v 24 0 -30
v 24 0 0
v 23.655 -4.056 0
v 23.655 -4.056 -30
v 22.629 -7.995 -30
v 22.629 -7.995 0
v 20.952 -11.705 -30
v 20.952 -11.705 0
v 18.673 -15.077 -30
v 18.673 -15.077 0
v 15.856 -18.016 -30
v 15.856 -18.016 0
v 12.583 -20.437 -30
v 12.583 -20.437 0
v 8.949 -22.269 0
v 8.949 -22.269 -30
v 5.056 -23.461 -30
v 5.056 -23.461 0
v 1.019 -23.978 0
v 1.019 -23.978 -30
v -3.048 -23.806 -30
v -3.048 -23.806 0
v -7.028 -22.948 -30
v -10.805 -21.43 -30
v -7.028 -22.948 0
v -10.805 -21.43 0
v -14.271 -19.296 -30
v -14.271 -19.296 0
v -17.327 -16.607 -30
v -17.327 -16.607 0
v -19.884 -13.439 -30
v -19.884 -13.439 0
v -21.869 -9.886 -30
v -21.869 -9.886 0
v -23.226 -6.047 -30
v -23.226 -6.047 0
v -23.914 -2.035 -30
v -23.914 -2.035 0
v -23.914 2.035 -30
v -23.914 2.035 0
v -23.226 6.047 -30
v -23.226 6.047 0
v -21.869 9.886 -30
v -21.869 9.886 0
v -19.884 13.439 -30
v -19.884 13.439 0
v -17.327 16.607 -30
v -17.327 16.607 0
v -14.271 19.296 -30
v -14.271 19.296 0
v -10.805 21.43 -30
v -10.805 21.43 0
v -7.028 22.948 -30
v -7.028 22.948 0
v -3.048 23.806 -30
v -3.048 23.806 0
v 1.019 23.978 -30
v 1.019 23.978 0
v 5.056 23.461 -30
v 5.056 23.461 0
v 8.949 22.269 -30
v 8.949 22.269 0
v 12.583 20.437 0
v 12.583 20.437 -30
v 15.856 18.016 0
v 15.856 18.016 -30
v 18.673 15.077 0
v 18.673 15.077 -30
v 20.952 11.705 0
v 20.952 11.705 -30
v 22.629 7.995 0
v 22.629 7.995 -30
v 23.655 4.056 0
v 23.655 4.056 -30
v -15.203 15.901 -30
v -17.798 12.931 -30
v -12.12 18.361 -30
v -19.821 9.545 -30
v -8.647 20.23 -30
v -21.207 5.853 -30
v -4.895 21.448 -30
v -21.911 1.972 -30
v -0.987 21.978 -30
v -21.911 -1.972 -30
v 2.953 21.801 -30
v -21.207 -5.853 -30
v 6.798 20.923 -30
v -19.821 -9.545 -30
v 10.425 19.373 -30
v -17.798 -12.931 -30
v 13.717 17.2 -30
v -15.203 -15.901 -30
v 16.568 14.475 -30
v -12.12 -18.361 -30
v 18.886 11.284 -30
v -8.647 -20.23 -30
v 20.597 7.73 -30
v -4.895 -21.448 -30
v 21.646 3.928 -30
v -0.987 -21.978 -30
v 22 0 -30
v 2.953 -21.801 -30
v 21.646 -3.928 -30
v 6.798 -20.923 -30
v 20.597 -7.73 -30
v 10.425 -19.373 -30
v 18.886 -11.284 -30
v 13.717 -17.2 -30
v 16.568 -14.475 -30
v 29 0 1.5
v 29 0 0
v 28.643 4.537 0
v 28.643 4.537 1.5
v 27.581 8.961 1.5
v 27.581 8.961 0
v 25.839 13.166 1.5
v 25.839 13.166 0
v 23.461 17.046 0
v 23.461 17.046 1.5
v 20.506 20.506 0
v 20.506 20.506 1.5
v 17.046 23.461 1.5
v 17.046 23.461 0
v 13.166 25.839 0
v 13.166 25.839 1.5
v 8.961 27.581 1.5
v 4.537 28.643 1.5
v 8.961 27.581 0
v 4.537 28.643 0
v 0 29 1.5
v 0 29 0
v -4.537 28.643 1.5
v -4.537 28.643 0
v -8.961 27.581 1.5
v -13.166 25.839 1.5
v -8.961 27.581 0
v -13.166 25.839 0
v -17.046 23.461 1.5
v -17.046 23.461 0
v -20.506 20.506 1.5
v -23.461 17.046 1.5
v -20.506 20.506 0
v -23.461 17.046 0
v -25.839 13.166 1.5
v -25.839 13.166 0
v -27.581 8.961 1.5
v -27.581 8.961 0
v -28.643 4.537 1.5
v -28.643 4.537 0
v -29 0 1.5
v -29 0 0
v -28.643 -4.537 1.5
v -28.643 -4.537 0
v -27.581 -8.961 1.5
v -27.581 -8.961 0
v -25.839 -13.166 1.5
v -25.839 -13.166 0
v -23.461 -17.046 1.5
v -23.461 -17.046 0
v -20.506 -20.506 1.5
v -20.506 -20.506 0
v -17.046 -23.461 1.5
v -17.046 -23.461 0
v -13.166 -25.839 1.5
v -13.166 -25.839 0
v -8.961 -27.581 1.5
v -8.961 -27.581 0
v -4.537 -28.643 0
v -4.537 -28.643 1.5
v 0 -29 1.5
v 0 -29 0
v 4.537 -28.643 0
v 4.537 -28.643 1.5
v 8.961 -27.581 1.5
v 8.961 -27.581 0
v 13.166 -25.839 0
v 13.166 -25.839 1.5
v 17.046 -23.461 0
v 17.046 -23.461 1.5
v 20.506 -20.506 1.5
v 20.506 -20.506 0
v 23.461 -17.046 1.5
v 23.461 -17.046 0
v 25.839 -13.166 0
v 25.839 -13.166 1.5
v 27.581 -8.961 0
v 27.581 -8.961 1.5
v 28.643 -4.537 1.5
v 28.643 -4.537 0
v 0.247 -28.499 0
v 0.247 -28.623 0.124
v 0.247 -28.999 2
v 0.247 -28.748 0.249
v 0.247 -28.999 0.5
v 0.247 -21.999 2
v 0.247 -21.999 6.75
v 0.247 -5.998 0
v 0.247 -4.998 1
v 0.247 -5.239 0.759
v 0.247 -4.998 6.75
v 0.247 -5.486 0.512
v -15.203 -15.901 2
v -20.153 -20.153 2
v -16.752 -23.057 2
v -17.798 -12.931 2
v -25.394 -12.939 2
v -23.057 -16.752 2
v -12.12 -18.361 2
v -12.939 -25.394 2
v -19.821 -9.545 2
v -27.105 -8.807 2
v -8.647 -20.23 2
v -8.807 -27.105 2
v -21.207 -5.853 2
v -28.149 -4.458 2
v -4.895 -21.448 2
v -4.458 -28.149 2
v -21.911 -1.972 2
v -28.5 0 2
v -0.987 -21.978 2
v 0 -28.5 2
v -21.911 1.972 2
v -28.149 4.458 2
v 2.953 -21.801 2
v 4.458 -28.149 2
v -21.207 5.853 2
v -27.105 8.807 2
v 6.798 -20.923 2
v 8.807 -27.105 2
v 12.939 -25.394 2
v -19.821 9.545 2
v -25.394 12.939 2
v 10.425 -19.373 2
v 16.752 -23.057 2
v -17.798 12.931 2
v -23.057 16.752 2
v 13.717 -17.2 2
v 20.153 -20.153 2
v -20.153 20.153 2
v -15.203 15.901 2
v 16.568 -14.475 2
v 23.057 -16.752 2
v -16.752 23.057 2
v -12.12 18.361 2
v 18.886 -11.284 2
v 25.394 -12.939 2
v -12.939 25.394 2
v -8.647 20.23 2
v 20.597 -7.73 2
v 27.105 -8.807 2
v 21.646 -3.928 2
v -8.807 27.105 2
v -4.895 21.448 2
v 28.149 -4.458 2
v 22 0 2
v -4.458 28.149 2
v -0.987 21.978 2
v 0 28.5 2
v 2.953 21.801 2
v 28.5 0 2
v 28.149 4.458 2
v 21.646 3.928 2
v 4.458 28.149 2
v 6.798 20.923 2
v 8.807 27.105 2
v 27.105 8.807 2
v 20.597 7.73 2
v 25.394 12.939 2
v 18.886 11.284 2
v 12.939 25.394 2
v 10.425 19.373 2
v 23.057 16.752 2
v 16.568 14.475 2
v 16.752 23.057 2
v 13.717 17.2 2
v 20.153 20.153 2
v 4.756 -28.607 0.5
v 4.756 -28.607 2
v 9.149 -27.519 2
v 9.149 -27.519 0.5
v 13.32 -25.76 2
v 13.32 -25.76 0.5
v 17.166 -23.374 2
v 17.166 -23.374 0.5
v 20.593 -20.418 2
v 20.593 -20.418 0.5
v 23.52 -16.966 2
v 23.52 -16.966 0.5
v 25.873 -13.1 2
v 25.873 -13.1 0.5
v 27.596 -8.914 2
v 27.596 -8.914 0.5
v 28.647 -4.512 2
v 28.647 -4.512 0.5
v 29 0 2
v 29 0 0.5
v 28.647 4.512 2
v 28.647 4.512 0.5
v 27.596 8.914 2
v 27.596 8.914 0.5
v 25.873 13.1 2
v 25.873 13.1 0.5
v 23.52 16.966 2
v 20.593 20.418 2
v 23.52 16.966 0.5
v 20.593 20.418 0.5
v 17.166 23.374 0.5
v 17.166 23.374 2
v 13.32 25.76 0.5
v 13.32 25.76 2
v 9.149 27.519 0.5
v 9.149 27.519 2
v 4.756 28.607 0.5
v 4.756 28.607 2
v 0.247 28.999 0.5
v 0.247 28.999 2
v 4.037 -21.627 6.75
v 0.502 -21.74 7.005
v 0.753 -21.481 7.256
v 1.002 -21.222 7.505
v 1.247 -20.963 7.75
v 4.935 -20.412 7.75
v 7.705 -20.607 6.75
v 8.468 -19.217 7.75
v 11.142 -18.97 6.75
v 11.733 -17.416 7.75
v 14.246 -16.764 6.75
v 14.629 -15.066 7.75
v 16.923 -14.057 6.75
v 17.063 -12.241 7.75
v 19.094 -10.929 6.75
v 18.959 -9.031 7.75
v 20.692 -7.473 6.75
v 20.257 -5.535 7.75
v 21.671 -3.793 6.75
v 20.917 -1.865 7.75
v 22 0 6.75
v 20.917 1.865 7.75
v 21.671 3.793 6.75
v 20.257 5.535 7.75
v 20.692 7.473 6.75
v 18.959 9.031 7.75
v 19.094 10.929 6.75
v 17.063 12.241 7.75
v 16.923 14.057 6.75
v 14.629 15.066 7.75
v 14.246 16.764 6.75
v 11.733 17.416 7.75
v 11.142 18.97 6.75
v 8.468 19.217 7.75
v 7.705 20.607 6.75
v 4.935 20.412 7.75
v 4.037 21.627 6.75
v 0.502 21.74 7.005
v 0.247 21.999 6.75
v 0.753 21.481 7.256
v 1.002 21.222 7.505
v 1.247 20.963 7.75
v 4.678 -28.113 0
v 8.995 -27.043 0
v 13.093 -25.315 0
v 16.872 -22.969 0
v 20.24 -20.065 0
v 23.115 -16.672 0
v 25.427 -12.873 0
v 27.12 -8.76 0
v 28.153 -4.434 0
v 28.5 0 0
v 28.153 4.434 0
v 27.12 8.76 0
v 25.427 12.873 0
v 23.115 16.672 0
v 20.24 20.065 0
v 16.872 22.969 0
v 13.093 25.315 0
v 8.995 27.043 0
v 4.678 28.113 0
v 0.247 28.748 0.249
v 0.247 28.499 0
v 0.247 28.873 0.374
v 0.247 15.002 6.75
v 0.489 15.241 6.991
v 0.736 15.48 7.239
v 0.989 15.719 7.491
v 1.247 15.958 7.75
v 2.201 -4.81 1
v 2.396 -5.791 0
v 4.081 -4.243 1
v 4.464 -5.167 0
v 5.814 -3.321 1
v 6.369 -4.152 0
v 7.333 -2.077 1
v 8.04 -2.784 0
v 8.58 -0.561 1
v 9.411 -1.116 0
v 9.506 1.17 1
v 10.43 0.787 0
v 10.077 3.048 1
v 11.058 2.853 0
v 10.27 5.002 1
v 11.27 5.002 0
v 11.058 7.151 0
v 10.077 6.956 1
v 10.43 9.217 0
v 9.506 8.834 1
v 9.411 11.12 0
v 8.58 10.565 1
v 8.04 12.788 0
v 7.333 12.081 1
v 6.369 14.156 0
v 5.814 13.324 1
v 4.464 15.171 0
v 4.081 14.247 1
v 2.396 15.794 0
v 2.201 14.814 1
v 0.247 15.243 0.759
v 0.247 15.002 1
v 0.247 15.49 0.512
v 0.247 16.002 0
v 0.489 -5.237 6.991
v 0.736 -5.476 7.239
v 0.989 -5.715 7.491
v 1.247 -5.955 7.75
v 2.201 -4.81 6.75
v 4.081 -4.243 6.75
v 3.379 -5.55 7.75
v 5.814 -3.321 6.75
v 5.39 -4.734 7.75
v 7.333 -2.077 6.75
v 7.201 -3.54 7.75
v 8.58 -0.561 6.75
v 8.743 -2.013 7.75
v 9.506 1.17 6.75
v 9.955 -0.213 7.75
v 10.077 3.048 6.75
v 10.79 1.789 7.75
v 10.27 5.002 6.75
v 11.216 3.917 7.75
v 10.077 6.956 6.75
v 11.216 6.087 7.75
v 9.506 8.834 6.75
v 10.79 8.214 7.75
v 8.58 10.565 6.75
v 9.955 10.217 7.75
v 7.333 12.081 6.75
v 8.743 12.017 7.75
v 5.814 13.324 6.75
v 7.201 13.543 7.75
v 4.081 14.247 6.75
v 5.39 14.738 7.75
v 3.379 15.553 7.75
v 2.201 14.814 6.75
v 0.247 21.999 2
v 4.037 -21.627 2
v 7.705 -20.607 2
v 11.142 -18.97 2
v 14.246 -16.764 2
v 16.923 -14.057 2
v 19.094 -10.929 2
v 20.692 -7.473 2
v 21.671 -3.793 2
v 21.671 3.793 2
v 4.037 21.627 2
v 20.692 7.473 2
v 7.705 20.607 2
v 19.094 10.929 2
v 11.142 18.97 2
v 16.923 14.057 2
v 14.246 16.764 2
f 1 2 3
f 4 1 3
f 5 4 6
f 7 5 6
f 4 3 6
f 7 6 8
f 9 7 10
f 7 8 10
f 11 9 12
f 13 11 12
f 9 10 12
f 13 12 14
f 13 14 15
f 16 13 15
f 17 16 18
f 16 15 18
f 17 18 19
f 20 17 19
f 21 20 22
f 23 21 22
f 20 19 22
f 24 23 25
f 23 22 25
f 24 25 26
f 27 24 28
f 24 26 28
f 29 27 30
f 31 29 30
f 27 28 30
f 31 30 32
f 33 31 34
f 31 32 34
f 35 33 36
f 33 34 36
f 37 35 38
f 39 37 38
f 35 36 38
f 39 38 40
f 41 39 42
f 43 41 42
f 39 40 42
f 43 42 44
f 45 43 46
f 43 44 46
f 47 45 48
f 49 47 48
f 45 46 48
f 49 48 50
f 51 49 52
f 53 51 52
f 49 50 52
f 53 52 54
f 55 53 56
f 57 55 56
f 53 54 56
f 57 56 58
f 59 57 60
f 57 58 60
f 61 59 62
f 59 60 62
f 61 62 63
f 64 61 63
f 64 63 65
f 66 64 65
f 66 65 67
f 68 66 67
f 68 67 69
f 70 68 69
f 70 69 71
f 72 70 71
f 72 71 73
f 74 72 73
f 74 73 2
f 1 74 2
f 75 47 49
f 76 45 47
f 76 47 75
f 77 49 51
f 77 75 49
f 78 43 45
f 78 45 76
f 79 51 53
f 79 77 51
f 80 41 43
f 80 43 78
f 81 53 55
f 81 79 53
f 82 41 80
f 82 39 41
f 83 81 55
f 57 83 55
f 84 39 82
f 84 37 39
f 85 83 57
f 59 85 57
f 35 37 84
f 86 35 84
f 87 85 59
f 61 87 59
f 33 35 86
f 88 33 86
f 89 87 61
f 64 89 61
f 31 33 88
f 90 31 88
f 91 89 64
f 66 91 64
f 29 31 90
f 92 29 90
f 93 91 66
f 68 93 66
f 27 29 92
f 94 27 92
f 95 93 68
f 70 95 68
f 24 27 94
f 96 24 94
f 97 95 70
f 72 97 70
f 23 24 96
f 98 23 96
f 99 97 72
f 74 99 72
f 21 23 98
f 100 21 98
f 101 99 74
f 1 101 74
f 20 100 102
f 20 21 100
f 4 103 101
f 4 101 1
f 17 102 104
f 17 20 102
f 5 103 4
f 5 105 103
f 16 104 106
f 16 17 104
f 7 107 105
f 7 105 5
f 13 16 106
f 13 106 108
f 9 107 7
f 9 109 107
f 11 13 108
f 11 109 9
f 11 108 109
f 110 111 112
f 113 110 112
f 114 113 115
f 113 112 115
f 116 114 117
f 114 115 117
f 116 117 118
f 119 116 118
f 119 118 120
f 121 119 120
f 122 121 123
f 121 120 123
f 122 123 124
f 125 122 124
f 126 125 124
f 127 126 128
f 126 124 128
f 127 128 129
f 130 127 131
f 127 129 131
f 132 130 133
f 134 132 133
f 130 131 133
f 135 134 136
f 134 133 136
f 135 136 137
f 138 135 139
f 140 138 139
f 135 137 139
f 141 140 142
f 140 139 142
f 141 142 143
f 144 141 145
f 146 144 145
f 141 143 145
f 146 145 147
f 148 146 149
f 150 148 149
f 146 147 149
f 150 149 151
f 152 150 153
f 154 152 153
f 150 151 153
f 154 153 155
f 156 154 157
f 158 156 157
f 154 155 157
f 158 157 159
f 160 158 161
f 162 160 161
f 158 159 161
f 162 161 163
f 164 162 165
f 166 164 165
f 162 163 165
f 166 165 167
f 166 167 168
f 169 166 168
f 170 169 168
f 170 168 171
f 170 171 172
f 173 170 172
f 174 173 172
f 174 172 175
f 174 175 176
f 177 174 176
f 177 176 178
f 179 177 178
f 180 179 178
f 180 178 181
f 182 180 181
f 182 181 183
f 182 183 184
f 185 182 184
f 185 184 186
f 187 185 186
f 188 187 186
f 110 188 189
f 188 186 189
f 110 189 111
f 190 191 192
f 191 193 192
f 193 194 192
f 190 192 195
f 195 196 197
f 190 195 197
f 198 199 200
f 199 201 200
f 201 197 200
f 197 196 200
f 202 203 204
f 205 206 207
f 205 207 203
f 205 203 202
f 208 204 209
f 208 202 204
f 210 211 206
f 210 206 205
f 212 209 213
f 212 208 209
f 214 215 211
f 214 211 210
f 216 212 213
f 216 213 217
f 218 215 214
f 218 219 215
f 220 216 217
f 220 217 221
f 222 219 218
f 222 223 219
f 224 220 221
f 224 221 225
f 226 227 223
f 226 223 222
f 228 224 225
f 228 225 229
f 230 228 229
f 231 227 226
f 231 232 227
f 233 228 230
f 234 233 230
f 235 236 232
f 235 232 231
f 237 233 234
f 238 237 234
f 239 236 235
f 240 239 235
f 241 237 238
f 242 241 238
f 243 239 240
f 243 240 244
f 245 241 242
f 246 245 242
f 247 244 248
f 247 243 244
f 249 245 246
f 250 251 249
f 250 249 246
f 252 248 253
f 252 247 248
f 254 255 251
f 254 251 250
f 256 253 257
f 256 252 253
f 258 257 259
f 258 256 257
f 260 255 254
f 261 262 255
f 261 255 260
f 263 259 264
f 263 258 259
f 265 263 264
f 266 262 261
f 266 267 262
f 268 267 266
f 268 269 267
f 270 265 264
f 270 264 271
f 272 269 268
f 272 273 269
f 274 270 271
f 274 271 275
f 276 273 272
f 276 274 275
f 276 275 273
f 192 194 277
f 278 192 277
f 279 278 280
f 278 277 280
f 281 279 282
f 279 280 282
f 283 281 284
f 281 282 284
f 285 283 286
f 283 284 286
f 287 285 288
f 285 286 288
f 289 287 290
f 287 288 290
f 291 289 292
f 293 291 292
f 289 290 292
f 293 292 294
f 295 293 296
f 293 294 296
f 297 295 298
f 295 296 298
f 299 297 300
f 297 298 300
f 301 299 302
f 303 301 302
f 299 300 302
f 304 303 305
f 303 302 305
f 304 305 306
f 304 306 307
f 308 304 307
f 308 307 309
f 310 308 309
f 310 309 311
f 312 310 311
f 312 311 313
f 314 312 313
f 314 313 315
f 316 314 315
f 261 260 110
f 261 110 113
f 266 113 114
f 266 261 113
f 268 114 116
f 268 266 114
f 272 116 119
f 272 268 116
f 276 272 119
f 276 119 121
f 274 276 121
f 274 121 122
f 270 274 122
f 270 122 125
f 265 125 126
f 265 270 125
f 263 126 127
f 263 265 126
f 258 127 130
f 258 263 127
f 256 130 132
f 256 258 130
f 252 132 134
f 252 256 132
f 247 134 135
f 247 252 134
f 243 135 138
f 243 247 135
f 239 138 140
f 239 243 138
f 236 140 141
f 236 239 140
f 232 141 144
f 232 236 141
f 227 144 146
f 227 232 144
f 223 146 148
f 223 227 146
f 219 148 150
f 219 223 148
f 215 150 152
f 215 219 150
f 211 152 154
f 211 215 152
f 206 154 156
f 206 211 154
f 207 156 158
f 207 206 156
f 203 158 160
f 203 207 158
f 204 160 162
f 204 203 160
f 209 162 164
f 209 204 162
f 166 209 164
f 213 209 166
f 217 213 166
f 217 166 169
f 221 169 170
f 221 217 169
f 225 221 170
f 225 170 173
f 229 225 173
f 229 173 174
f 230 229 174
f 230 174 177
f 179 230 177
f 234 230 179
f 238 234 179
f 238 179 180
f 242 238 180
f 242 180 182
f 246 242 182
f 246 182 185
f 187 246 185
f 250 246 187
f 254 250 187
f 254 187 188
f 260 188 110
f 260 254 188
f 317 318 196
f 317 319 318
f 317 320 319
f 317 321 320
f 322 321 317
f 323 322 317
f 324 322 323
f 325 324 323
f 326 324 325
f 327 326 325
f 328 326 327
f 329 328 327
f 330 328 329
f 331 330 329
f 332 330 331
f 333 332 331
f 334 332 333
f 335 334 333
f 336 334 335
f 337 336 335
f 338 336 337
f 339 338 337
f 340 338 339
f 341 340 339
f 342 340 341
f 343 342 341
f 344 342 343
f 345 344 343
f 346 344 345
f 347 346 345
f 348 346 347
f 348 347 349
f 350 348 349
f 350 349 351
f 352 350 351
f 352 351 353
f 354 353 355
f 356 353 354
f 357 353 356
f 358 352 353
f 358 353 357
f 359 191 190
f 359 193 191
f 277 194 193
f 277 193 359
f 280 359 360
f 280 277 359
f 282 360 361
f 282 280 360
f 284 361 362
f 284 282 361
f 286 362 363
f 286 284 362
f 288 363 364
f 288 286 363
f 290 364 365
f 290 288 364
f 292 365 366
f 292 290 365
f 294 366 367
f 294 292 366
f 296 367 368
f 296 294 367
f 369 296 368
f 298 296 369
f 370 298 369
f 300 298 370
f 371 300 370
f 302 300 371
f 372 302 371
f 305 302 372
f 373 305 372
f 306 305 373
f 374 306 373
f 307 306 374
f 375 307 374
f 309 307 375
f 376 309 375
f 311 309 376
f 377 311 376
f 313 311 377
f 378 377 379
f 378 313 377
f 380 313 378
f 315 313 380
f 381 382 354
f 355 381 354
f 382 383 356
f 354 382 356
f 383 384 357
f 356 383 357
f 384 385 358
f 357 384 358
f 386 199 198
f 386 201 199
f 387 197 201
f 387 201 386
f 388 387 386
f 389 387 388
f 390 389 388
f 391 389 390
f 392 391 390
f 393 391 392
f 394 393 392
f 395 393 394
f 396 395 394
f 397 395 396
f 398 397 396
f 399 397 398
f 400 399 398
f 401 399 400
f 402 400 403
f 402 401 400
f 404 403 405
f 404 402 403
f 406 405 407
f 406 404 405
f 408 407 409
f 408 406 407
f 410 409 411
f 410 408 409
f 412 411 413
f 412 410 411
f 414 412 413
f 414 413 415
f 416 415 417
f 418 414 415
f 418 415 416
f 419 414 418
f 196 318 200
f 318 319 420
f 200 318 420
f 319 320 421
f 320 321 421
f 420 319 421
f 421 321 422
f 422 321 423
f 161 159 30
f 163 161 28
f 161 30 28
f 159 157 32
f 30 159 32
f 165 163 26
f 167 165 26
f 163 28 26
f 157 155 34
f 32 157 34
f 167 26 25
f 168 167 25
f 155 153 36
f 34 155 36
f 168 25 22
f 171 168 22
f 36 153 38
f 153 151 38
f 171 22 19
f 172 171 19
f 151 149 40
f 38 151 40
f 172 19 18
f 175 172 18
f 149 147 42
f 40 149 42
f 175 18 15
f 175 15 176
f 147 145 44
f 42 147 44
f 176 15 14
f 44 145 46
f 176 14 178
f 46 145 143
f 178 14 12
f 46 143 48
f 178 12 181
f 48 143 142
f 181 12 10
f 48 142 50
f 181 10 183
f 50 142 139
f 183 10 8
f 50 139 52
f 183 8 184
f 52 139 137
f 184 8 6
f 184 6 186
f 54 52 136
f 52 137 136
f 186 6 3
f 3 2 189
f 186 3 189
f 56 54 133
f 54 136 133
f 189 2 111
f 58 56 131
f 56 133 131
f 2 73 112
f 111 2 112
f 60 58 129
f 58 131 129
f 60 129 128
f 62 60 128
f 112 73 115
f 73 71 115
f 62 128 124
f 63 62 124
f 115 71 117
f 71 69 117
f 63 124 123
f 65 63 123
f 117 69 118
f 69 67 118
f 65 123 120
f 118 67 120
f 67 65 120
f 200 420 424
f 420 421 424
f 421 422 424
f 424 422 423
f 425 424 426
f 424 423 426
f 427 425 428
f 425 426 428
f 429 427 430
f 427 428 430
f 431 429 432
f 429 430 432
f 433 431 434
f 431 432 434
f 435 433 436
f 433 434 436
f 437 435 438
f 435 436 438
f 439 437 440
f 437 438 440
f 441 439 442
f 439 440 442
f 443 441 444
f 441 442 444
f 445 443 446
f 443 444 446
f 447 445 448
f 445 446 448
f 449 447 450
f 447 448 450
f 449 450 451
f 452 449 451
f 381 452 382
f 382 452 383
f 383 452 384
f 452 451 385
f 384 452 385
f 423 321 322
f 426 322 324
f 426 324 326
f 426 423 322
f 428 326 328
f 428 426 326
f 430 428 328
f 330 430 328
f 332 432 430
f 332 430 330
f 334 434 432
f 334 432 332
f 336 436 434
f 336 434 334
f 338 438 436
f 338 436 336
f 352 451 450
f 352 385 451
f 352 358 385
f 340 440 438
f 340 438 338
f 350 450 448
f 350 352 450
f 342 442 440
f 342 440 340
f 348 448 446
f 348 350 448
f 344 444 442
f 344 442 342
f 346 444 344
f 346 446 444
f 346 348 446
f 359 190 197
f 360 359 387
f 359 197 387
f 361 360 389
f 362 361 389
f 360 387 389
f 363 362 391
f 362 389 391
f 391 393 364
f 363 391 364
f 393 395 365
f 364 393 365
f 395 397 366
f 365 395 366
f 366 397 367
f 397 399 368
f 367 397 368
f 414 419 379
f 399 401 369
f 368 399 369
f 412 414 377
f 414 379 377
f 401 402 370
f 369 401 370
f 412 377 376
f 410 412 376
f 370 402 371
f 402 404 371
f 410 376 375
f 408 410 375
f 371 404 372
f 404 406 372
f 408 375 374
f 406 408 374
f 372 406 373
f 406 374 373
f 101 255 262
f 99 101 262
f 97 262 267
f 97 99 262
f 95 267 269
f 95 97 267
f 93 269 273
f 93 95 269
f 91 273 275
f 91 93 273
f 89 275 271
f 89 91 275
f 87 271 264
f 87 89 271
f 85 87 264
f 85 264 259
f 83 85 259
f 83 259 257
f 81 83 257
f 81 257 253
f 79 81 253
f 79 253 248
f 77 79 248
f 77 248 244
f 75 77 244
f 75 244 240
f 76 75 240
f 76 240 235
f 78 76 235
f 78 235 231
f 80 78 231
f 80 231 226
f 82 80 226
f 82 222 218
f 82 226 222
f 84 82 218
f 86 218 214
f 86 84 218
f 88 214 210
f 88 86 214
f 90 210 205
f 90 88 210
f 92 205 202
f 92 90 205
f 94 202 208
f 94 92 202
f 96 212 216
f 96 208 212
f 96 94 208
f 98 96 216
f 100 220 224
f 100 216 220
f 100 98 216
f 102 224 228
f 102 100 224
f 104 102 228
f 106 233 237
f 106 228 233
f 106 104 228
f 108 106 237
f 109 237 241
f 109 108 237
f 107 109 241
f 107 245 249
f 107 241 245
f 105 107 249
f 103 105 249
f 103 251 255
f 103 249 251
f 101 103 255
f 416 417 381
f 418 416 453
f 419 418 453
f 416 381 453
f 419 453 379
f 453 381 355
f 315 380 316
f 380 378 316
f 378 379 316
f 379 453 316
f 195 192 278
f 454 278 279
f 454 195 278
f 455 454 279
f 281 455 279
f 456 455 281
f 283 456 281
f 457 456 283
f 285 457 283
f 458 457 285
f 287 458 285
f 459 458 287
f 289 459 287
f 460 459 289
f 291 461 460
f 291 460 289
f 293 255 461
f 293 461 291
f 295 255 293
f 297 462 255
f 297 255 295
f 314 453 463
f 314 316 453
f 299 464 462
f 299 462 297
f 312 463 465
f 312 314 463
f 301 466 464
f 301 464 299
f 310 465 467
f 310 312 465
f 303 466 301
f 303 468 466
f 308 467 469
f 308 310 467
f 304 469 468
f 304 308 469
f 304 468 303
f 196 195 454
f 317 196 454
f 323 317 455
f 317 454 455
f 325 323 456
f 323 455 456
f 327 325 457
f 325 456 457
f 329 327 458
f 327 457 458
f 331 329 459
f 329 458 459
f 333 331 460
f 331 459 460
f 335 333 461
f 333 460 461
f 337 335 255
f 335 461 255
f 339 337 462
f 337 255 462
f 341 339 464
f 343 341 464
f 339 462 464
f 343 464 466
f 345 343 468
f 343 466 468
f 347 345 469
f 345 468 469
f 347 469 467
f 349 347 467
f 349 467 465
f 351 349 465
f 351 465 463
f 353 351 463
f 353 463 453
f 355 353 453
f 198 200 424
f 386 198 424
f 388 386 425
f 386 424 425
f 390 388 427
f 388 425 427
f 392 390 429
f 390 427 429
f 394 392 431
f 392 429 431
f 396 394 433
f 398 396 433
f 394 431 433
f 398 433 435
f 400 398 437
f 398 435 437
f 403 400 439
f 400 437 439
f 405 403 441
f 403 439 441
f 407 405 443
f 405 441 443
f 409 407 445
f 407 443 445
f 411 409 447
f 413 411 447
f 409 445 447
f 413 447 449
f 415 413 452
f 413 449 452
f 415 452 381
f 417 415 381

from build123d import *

# Parameters (mm, degrees)
SKETCH003_W     = 0.25
SKETCH003_H     = 59.502016
PAD002_DEPTH    = 10.5
PAD_DEPTH       = 2
PAD001_DEPTH    = 7.75
POCKET_DEPTH    = 7.751
CHAMFER_SIZE    = 0.5
CHAMFER001_SIZE = 1
CHAMFER002_SIZE = 1
SKETCH005_R     = 29
PAD003_DEPTH    = 2
CHAMFER003_SIZE = 0.5
SKETCH004_R     = 24
PAD004_DEPTH    = 30
SKETCH006_R     = 22
POCKET001_DEPTH = 32.001


with BuildPart() as body001:
    # Sketch003 → Pad002 (new body, symmetric)
    with BuildSketch(Plane.XY):
        with Locations((0.122298, 0.033355)):
            Rectangle(SKETCH003_W, SKETCH003_H)
    extrude(amount=PAD002_DEPTH, both=True)


with BuildPart() as router_table_insert_cap:
    # Sketch → Pad (new body)
    with BuildSketch(Plane.XY):
        with BuildLine():
            ThreePointArc((0, -29), (29, 0), (0, 29))
            Line((0, 29), (0, -29))
        make_face()
    extrude(amount=PAD_DEPTH)

    # Sketch001 → Pad001 (join)
    with BuildSketch(Plane.XY):
        with BuildLine():
            ThreePointArc((0, -22), (22, 0), (0, 22))
            Line((0, 22), (0, -22))
        make_face()
    extrude(amount=PAD001_DEPTH)

    # Sketch002 (on DatumPlane) → Pocket (cut, through all)
    with BuildSketch(Plane.XY.offset(7.75)):
        with BuildLine():
            Line((0.073359, 15), (0.073359, -4.996142))
            ThreePointArc((0.073359, -4.996142), (10.269766, 5.001929), (0.073359, 15))
        make_face()
    extrude(amount=-POCKET_DEPTH, mode=Mode.SUBTRACT)

    # Chamfer
    chamfer_edges = [router_table_insert_cap.edges().sort_by_distance(p)[0] for p in [
        (29, 0, 0),
    ]]
    chamfer(chamfer_edges, length=CHAMFER_SIZE)

    # Boolean: cut Body001
    add(body001.part, mode=Mode.SUBTRACT)

    # Chamfer001
    chamfer001_edges = [router_table_insert_cap.edges().sort_by_distance(p)[0] for p in [
        (10.269766, 5.001929, 7.75),
        (0.247298, -13.498328, 7.75),
        (0.247298, 18.500257, 7.75),
        (22, 0, 7.75),
    ]]
    chamfer(chamfer001_edges, length=CHAMFER001_SIZE)

    # Chamfer002
    chamfer002_edges = [router_table_insert_cap.edges().sort_by_distance(p)[0] for p in [
        (10.269766, 5.001929, 0),
    ]]
    chamfer(chamfer002_edges, length=CHAMFER002_SIZE)


with BuildPart() as router_table_insert:
    # Sketch005 → Pad003 (new body)
    with BuildSketch(Plane.XY):
        Circle(SKETCH005_R)
    extrude(amount=PAD003_DEPTH)

    # Chamfer003
    chamfer003_edges = [router_table_insert.edges().sort_by_distance(p)[0] for p in [
        (-29, 0, 2),
    ]]
    chamfer(chamfer003_edges, length=CHAMFER003_SIZE)

    # Sketch004 → Pad004 (join)
    with BuildSketch(Plane(origin=(0, 0, 0), x_dir=(1, 0, 0), z_dir=(0, 0, -1))):
        Circle(SKETCH004_R)
    extrude(amount=PAD004_DEPTH)

    # Sketch006 → Pocket001 (cut, through all)
    with BuildSketch(Plane.XY.offset(-30)):
        Circle(SKETCH006_R)
    extrude(amount=POCKET001_DEPTH, mode=Mode.SUBTRACT)


solid = Compound([router_table_insert_cap.part, router_table_insert.part])
